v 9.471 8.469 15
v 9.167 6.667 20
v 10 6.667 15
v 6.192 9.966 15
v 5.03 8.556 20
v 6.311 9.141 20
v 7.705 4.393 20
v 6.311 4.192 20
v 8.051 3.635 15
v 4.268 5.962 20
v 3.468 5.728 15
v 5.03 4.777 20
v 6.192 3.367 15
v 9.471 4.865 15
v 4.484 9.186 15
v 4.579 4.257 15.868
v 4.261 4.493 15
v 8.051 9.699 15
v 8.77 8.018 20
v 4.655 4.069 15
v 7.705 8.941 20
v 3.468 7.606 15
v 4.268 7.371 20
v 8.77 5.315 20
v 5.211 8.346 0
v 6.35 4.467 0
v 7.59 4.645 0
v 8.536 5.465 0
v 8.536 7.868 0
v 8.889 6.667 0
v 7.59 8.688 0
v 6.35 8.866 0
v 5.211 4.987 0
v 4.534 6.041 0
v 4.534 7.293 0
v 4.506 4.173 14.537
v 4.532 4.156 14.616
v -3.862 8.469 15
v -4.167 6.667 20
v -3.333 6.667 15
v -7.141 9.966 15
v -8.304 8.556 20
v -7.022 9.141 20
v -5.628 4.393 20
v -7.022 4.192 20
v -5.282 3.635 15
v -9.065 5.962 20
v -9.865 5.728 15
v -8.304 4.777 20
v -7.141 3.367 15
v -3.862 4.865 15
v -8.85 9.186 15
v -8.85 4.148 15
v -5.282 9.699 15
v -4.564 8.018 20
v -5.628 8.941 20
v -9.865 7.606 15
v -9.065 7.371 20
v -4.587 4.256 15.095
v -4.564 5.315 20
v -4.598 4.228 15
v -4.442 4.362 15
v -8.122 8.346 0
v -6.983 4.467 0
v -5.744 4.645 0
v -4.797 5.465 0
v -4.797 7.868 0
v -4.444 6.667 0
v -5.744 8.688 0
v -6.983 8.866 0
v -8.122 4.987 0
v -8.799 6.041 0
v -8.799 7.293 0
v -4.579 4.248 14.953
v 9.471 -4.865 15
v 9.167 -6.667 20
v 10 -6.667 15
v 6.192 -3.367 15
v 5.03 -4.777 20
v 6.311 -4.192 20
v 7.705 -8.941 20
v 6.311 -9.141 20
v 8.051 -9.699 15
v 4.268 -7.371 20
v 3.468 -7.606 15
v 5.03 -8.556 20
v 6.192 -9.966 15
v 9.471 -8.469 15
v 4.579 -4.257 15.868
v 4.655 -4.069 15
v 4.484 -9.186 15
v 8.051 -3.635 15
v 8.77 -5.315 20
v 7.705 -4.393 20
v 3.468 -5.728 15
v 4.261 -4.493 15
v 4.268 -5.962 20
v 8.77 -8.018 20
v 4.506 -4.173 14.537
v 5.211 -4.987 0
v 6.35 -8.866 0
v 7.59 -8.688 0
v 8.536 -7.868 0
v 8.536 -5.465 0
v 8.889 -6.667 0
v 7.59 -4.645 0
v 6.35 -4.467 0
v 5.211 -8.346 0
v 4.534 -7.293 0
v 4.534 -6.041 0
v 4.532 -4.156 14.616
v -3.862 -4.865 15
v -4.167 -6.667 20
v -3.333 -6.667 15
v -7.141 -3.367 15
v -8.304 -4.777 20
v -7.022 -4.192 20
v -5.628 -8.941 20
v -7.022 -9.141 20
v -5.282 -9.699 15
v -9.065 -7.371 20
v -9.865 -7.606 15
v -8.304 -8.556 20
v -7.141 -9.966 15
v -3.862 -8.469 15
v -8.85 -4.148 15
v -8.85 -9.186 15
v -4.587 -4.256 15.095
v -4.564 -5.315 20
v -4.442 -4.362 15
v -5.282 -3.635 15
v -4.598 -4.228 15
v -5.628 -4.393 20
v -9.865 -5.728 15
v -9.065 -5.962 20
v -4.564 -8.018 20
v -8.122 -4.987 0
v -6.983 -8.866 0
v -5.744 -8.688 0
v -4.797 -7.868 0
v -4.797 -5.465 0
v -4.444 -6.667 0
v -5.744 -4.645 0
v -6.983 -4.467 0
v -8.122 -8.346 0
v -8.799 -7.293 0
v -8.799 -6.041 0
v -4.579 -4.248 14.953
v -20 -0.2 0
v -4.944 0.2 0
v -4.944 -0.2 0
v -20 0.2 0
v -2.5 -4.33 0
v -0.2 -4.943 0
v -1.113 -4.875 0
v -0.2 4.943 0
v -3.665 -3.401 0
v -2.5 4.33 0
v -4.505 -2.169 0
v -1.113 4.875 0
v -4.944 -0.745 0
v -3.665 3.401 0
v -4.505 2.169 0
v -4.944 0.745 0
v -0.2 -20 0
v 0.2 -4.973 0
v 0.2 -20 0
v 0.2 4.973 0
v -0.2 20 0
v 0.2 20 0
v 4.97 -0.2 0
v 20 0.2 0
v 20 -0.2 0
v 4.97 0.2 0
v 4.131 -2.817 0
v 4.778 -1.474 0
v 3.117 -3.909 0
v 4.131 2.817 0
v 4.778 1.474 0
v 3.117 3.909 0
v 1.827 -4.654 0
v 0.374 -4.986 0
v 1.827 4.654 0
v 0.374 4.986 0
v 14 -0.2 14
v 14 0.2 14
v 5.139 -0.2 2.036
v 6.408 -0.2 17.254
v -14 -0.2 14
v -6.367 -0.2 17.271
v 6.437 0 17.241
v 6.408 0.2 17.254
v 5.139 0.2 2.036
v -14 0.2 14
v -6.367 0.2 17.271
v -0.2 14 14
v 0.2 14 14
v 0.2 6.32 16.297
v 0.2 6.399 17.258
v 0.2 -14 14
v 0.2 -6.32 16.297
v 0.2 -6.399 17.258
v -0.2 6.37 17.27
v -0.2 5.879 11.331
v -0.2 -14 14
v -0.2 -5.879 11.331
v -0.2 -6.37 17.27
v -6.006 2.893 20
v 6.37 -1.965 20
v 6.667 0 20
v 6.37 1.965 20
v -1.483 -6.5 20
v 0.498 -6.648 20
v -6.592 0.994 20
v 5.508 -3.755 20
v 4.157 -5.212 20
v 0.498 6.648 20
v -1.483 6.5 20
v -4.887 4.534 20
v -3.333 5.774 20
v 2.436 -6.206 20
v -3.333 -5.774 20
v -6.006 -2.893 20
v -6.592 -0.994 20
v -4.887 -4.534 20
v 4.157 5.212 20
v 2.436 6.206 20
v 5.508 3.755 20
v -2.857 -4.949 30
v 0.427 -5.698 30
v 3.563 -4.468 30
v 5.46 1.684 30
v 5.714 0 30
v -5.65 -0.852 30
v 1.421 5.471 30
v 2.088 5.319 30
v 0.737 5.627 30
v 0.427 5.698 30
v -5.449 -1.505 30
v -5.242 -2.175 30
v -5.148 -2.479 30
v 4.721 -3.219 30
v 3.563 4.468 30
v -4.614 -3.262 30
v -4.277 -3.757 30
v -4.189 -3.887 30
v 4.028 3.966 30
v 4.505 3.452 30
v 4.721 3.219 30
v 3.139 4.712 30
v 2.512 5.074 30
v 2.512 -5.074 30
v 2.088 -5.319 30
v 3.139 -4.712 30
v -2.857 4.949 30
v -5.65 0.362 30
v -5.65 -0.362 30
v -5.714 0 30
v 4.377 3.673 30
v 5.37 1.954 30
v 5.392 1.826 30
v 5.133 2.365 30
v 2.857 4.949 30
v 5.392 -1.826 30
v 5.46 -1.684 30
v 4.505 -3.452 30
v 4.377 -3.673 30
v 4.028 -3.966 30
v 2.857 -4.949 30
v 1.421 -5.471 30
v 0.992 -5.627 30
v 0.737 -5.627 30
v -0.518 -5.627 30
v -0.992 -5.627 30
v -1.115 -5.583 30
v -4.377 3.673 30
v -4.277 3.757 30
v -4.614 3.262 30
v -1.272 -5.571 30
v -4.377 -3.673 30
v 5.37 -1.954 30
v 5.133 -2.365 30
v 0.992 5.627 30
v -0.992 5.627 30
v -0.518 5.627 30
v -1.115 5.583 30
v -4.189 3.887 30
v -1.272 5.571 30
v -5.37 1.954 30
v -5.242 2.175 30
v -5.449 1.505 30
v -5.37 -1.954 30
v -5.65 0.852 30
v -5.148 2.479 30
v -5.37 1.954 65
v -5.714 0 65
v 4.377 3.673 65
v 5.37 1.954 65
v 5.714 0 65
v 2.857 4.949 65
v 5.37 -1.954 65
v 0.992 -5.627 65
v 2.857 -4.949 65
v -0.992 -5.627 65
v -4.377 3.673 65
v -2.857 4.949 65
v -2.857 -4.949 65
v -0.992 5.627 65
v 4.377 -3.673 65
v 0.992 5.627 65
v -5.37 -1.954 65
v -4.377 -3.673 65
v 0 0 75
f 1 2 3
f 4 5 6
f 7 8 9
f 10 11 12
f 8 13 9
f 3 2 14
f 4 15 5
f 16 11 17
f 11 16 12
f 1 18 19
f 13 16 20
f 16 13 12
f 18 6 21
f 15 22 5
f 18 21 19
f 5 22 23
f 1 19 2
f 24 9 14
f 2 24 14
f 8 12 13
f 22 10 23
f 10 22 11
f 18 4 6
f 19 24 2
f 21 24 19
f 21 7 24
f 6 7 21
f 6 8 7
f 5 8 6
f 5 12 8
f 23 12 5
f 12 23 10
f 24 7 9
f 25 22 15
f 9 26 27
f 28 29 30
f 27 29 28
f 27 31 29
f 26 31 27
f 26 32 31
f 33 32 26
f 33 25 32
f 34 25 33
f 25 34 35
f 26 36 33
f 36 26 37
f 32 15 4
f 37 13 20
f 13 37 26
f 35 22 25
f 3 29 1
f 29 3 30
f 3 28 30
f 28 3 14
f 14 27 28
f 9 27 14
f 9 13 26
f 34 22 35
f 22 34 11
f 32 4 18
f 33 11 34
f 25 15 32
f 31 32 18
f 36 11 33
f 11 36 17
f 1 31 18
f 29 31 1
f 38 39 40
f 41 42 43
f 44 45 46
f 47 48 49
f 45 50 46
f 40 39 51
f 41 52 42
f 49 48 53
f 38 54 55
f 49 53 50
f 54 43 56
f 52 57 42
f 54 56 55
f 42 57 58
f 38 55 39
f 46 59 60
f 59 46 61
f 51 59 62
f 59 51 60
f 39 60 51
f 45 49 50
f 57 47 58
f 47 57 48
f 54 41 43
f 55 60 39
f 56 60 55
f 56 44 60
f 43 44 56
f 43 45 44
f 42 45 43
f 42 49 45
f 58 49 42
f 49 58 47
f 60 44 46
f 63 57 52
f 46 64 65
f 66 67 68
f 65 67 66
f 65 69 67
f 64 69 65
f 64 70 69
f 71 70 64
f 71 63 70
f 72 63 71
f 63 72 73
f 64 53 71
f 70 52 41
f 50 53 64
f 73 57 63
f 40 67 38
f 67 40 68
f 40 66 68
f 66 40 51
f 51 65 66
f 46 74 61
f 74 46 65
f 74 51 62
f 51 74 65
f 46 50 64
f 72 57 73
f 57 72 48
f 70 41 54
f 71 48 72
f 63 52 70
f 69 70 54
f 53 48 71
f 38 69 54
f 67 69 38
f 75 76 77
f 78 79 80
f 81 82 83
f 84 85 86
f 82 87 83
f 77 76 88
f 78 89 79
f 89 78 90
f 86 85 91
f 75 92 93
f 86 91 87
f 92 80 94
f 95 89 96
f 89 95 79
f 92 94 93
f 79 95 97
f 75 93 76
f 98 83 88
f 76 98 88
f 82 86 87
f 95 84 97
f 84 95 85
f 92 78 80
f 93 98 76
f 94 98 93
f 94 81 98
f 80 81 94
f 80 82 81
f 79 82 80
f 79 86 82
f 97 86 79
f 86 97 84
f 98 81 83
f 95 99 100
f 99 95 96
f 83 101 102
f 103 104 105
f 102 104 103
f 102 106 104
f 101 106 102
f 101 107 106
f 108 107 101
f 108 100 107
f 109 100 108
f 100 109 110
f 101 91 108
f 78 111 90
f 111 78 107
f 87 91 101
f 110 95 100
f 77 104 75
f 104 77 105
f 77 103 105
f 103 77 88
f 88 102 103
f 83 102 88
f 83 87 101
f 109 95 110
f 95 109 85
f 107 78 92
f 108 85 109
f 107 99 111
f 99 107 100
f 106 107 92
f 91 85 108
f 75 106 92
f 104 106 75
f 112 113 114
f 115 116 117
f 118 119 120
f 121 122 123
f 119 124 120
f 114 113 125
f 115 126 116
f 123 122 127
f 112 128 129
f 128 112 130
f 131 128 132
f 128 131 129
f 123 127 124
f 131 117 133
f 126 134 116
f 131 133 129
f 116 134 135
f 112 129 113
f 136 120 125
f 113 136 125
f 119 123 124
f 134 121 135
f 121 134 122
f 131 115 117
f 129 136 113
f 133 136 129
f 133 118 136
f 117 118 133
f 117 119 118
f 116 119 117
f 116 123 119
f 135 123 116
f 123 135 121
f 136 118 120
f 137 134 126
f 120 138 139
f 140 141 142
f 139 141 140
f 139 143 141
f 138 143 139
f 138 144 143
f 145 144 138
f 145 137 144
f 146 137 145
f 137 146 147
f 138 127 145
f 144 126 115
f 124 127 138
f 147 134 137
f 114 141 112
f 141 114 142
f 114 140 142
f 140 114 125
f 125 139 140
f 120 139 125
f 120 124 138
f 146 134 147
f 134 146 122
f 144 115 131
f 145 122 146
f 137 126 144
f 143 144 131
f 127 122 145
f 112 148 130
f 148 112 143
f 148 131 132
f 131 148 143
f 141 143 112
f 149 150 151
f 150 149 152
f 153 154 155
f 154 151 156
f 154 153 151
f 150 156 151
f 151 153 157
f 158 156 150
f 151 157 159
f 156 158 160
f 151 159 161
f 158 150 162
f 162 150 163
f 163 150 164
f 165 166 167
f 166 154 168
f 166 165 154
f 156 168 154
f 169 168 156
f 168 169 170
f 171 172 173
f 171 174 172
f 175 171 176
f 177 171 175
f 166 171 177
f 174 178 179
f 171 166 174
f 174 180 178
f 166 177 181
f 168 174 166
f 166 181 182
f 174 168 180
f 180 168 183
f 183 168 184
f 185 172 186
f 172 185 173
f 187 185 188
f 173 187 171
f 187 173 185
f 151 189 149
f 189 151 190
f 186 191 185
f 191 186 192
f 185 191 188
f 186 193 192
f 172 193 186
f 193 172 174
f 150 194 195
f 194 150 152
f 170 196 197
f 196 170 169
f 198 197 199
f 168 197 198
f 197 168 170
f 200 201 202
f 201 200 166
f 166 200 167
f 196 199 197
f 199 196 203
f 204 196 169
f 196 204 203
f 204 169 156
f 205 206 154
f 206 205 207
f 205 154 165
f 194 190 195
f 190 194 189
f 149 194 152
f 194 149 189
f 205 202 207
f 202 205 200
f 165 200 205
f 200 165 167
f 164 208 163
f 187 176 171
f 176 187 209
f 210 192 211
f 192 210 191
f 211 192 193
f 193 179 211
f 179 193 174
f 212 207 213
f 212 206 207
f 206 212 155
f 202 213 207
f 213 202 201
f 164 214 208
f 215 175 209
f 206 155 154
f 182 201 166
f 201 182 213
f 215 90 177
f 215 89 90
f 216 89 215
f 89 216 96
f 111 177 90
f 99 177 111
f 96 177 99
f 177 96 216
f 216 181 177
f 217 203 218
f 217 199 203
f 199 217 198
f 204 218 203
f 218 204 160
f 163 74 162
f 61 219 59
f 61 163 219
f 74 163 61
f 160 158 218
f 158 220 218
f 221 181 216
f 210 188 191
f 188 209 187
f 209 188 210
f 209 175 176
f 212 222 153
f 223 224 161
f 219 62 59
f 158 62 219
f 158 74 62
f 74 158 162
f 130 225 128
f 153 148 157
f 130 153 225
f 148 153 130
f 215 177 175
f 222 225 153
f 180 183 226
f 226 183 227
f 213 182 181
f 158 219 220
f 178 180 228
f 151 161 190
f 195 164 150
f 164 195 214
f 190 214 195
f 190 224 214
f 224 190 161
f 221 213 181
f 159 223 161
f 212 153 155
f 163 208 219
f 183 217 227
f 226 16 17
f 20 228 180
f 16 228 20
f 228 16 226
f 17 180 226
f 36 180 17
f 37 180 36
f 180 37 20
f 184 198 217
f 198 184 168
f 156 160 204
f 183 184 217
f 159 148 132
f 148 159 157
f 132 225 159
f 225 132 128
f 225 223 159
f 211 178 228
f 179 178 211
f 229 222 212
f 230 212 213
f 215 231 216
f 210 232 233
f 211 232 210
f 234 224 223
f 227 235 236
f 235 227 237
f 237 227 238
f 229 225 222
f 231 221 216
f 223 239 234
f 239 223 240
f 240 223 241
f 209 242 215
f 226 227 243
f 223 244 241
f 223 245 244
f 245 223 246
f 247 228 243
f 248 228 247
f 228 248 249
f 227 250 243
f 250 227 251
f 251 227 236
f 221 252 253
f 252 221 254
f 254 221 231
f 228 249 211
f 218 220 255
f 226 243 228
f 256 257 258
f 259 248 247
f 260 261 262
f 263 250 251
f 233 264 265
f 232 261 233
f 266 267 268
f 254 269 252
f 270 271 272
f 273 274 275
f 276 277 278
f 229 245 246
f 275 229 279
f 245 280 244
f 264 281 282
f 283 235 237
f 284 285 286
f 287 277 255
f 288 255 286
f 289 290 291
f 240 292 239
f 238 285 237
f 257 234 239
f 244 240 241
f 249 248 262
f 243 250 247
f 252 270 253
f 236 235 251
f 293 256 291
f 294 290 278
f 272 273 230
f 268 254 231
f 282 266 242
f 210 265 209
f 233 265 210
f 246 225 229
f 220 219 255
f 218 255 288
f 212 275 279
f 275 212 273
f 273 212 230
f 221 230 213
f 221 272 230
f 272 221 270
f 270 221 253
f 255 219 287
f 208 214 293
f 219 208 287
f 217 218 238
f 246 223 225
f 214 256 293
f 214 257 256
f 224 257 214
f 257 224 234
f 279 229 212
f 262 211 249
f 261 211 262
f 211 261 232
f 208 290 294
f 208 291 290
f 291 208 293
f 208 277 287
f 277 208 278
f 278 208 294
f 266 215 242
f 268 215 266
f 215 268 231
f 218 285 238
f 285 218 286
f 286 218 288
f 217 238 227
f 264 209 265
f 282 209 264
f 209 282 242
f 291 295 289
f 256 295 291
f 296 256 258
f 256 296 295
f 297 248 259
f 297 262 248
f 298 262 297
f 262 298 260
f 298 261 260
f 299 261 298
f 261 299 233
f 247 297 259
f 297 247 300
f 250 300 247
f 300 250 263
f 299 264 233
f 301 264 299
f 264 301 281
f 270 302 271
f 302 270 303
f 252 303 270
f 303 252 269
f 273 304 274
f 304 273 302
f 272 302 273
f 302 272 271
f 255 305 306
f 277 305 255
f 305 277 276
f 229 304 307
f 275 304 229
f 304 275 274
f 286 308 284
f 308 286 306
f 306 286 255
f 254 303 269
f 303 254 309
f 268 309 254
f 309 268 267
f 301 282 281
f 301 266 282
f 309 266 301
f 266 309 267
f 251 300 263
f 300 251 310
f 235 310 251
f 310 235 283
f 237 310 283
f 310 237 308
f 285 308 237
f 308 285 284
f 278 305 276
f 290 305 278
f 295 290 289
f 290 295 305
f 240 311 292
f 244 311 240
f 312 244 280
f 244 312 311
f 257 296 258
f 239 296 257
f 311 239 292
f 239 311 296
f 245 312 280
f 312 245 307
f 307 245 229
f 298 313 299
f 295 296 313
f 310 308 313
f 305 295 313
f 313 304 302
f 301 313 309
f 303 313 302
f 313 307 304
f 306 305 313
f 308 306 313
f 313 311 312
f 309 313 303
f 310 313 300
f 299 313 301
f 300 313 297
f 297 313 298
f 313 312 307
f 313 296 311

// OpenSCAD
module wing(scale=10) {
	rotate([90,0,0])
	linear_extrude(height = scale*0.02, center = true)
	polygon(points=[[0,0],[0,scale],[scale*0.7,scale*0.7],[scale,0]]);
}

module booster(scale=10) {
	translate([0,0,scale*0.75])	
	cylinder(h = scale*0.25, r1=scale/6, r2=scale/8);
	cylinder(h = scale*0.75, r1=scale/9, r2=scale/6);
}

module rocket(scale=10) {
	rotate([0,0,0])
	wing(scale);

	rotate([0,0,90])
	wing(scale);

	rotate([0,0,180])
	wing(scale);

	rotate([0,0,270])
	wing(scale);

	translate([scale/3,scale/3])	
	booster(scale);
	translate([-scale/3,scale/3])	
	booster(scale);
	translate([scale/3,-scale/3])	
	booster(scale);
	translate([-scale/3,-scale/3])	
	booster(scale);

	// Cylinder base
	color("green",0.5)
	cylinder(h = scale, r1=scale/4, r2=scale/3);

	// Cylinder mid
	midHeight = scale/2;
	midWidth  = scale/3.5;
	translate([0,0,scale])
	color("red",0.5)
	cylinder(h = midHeight, r1=scale/3, r2=midWidth);

	// Cylinder long
	longHeight = scale+midHeight;
	translate([0,0,longHeight])
	color("blue",0.5)
	cylinder(h = scale*1.75, r1=midWidth, r2=scale/3.5);

	coneHeight = scale*1.75+longHeight;
	translate([0,0,coneHeight])
	color("black",0.5)
	cylinder(h = (scale/2), r1=midWidth, r2=0);

}





rocket(20);
